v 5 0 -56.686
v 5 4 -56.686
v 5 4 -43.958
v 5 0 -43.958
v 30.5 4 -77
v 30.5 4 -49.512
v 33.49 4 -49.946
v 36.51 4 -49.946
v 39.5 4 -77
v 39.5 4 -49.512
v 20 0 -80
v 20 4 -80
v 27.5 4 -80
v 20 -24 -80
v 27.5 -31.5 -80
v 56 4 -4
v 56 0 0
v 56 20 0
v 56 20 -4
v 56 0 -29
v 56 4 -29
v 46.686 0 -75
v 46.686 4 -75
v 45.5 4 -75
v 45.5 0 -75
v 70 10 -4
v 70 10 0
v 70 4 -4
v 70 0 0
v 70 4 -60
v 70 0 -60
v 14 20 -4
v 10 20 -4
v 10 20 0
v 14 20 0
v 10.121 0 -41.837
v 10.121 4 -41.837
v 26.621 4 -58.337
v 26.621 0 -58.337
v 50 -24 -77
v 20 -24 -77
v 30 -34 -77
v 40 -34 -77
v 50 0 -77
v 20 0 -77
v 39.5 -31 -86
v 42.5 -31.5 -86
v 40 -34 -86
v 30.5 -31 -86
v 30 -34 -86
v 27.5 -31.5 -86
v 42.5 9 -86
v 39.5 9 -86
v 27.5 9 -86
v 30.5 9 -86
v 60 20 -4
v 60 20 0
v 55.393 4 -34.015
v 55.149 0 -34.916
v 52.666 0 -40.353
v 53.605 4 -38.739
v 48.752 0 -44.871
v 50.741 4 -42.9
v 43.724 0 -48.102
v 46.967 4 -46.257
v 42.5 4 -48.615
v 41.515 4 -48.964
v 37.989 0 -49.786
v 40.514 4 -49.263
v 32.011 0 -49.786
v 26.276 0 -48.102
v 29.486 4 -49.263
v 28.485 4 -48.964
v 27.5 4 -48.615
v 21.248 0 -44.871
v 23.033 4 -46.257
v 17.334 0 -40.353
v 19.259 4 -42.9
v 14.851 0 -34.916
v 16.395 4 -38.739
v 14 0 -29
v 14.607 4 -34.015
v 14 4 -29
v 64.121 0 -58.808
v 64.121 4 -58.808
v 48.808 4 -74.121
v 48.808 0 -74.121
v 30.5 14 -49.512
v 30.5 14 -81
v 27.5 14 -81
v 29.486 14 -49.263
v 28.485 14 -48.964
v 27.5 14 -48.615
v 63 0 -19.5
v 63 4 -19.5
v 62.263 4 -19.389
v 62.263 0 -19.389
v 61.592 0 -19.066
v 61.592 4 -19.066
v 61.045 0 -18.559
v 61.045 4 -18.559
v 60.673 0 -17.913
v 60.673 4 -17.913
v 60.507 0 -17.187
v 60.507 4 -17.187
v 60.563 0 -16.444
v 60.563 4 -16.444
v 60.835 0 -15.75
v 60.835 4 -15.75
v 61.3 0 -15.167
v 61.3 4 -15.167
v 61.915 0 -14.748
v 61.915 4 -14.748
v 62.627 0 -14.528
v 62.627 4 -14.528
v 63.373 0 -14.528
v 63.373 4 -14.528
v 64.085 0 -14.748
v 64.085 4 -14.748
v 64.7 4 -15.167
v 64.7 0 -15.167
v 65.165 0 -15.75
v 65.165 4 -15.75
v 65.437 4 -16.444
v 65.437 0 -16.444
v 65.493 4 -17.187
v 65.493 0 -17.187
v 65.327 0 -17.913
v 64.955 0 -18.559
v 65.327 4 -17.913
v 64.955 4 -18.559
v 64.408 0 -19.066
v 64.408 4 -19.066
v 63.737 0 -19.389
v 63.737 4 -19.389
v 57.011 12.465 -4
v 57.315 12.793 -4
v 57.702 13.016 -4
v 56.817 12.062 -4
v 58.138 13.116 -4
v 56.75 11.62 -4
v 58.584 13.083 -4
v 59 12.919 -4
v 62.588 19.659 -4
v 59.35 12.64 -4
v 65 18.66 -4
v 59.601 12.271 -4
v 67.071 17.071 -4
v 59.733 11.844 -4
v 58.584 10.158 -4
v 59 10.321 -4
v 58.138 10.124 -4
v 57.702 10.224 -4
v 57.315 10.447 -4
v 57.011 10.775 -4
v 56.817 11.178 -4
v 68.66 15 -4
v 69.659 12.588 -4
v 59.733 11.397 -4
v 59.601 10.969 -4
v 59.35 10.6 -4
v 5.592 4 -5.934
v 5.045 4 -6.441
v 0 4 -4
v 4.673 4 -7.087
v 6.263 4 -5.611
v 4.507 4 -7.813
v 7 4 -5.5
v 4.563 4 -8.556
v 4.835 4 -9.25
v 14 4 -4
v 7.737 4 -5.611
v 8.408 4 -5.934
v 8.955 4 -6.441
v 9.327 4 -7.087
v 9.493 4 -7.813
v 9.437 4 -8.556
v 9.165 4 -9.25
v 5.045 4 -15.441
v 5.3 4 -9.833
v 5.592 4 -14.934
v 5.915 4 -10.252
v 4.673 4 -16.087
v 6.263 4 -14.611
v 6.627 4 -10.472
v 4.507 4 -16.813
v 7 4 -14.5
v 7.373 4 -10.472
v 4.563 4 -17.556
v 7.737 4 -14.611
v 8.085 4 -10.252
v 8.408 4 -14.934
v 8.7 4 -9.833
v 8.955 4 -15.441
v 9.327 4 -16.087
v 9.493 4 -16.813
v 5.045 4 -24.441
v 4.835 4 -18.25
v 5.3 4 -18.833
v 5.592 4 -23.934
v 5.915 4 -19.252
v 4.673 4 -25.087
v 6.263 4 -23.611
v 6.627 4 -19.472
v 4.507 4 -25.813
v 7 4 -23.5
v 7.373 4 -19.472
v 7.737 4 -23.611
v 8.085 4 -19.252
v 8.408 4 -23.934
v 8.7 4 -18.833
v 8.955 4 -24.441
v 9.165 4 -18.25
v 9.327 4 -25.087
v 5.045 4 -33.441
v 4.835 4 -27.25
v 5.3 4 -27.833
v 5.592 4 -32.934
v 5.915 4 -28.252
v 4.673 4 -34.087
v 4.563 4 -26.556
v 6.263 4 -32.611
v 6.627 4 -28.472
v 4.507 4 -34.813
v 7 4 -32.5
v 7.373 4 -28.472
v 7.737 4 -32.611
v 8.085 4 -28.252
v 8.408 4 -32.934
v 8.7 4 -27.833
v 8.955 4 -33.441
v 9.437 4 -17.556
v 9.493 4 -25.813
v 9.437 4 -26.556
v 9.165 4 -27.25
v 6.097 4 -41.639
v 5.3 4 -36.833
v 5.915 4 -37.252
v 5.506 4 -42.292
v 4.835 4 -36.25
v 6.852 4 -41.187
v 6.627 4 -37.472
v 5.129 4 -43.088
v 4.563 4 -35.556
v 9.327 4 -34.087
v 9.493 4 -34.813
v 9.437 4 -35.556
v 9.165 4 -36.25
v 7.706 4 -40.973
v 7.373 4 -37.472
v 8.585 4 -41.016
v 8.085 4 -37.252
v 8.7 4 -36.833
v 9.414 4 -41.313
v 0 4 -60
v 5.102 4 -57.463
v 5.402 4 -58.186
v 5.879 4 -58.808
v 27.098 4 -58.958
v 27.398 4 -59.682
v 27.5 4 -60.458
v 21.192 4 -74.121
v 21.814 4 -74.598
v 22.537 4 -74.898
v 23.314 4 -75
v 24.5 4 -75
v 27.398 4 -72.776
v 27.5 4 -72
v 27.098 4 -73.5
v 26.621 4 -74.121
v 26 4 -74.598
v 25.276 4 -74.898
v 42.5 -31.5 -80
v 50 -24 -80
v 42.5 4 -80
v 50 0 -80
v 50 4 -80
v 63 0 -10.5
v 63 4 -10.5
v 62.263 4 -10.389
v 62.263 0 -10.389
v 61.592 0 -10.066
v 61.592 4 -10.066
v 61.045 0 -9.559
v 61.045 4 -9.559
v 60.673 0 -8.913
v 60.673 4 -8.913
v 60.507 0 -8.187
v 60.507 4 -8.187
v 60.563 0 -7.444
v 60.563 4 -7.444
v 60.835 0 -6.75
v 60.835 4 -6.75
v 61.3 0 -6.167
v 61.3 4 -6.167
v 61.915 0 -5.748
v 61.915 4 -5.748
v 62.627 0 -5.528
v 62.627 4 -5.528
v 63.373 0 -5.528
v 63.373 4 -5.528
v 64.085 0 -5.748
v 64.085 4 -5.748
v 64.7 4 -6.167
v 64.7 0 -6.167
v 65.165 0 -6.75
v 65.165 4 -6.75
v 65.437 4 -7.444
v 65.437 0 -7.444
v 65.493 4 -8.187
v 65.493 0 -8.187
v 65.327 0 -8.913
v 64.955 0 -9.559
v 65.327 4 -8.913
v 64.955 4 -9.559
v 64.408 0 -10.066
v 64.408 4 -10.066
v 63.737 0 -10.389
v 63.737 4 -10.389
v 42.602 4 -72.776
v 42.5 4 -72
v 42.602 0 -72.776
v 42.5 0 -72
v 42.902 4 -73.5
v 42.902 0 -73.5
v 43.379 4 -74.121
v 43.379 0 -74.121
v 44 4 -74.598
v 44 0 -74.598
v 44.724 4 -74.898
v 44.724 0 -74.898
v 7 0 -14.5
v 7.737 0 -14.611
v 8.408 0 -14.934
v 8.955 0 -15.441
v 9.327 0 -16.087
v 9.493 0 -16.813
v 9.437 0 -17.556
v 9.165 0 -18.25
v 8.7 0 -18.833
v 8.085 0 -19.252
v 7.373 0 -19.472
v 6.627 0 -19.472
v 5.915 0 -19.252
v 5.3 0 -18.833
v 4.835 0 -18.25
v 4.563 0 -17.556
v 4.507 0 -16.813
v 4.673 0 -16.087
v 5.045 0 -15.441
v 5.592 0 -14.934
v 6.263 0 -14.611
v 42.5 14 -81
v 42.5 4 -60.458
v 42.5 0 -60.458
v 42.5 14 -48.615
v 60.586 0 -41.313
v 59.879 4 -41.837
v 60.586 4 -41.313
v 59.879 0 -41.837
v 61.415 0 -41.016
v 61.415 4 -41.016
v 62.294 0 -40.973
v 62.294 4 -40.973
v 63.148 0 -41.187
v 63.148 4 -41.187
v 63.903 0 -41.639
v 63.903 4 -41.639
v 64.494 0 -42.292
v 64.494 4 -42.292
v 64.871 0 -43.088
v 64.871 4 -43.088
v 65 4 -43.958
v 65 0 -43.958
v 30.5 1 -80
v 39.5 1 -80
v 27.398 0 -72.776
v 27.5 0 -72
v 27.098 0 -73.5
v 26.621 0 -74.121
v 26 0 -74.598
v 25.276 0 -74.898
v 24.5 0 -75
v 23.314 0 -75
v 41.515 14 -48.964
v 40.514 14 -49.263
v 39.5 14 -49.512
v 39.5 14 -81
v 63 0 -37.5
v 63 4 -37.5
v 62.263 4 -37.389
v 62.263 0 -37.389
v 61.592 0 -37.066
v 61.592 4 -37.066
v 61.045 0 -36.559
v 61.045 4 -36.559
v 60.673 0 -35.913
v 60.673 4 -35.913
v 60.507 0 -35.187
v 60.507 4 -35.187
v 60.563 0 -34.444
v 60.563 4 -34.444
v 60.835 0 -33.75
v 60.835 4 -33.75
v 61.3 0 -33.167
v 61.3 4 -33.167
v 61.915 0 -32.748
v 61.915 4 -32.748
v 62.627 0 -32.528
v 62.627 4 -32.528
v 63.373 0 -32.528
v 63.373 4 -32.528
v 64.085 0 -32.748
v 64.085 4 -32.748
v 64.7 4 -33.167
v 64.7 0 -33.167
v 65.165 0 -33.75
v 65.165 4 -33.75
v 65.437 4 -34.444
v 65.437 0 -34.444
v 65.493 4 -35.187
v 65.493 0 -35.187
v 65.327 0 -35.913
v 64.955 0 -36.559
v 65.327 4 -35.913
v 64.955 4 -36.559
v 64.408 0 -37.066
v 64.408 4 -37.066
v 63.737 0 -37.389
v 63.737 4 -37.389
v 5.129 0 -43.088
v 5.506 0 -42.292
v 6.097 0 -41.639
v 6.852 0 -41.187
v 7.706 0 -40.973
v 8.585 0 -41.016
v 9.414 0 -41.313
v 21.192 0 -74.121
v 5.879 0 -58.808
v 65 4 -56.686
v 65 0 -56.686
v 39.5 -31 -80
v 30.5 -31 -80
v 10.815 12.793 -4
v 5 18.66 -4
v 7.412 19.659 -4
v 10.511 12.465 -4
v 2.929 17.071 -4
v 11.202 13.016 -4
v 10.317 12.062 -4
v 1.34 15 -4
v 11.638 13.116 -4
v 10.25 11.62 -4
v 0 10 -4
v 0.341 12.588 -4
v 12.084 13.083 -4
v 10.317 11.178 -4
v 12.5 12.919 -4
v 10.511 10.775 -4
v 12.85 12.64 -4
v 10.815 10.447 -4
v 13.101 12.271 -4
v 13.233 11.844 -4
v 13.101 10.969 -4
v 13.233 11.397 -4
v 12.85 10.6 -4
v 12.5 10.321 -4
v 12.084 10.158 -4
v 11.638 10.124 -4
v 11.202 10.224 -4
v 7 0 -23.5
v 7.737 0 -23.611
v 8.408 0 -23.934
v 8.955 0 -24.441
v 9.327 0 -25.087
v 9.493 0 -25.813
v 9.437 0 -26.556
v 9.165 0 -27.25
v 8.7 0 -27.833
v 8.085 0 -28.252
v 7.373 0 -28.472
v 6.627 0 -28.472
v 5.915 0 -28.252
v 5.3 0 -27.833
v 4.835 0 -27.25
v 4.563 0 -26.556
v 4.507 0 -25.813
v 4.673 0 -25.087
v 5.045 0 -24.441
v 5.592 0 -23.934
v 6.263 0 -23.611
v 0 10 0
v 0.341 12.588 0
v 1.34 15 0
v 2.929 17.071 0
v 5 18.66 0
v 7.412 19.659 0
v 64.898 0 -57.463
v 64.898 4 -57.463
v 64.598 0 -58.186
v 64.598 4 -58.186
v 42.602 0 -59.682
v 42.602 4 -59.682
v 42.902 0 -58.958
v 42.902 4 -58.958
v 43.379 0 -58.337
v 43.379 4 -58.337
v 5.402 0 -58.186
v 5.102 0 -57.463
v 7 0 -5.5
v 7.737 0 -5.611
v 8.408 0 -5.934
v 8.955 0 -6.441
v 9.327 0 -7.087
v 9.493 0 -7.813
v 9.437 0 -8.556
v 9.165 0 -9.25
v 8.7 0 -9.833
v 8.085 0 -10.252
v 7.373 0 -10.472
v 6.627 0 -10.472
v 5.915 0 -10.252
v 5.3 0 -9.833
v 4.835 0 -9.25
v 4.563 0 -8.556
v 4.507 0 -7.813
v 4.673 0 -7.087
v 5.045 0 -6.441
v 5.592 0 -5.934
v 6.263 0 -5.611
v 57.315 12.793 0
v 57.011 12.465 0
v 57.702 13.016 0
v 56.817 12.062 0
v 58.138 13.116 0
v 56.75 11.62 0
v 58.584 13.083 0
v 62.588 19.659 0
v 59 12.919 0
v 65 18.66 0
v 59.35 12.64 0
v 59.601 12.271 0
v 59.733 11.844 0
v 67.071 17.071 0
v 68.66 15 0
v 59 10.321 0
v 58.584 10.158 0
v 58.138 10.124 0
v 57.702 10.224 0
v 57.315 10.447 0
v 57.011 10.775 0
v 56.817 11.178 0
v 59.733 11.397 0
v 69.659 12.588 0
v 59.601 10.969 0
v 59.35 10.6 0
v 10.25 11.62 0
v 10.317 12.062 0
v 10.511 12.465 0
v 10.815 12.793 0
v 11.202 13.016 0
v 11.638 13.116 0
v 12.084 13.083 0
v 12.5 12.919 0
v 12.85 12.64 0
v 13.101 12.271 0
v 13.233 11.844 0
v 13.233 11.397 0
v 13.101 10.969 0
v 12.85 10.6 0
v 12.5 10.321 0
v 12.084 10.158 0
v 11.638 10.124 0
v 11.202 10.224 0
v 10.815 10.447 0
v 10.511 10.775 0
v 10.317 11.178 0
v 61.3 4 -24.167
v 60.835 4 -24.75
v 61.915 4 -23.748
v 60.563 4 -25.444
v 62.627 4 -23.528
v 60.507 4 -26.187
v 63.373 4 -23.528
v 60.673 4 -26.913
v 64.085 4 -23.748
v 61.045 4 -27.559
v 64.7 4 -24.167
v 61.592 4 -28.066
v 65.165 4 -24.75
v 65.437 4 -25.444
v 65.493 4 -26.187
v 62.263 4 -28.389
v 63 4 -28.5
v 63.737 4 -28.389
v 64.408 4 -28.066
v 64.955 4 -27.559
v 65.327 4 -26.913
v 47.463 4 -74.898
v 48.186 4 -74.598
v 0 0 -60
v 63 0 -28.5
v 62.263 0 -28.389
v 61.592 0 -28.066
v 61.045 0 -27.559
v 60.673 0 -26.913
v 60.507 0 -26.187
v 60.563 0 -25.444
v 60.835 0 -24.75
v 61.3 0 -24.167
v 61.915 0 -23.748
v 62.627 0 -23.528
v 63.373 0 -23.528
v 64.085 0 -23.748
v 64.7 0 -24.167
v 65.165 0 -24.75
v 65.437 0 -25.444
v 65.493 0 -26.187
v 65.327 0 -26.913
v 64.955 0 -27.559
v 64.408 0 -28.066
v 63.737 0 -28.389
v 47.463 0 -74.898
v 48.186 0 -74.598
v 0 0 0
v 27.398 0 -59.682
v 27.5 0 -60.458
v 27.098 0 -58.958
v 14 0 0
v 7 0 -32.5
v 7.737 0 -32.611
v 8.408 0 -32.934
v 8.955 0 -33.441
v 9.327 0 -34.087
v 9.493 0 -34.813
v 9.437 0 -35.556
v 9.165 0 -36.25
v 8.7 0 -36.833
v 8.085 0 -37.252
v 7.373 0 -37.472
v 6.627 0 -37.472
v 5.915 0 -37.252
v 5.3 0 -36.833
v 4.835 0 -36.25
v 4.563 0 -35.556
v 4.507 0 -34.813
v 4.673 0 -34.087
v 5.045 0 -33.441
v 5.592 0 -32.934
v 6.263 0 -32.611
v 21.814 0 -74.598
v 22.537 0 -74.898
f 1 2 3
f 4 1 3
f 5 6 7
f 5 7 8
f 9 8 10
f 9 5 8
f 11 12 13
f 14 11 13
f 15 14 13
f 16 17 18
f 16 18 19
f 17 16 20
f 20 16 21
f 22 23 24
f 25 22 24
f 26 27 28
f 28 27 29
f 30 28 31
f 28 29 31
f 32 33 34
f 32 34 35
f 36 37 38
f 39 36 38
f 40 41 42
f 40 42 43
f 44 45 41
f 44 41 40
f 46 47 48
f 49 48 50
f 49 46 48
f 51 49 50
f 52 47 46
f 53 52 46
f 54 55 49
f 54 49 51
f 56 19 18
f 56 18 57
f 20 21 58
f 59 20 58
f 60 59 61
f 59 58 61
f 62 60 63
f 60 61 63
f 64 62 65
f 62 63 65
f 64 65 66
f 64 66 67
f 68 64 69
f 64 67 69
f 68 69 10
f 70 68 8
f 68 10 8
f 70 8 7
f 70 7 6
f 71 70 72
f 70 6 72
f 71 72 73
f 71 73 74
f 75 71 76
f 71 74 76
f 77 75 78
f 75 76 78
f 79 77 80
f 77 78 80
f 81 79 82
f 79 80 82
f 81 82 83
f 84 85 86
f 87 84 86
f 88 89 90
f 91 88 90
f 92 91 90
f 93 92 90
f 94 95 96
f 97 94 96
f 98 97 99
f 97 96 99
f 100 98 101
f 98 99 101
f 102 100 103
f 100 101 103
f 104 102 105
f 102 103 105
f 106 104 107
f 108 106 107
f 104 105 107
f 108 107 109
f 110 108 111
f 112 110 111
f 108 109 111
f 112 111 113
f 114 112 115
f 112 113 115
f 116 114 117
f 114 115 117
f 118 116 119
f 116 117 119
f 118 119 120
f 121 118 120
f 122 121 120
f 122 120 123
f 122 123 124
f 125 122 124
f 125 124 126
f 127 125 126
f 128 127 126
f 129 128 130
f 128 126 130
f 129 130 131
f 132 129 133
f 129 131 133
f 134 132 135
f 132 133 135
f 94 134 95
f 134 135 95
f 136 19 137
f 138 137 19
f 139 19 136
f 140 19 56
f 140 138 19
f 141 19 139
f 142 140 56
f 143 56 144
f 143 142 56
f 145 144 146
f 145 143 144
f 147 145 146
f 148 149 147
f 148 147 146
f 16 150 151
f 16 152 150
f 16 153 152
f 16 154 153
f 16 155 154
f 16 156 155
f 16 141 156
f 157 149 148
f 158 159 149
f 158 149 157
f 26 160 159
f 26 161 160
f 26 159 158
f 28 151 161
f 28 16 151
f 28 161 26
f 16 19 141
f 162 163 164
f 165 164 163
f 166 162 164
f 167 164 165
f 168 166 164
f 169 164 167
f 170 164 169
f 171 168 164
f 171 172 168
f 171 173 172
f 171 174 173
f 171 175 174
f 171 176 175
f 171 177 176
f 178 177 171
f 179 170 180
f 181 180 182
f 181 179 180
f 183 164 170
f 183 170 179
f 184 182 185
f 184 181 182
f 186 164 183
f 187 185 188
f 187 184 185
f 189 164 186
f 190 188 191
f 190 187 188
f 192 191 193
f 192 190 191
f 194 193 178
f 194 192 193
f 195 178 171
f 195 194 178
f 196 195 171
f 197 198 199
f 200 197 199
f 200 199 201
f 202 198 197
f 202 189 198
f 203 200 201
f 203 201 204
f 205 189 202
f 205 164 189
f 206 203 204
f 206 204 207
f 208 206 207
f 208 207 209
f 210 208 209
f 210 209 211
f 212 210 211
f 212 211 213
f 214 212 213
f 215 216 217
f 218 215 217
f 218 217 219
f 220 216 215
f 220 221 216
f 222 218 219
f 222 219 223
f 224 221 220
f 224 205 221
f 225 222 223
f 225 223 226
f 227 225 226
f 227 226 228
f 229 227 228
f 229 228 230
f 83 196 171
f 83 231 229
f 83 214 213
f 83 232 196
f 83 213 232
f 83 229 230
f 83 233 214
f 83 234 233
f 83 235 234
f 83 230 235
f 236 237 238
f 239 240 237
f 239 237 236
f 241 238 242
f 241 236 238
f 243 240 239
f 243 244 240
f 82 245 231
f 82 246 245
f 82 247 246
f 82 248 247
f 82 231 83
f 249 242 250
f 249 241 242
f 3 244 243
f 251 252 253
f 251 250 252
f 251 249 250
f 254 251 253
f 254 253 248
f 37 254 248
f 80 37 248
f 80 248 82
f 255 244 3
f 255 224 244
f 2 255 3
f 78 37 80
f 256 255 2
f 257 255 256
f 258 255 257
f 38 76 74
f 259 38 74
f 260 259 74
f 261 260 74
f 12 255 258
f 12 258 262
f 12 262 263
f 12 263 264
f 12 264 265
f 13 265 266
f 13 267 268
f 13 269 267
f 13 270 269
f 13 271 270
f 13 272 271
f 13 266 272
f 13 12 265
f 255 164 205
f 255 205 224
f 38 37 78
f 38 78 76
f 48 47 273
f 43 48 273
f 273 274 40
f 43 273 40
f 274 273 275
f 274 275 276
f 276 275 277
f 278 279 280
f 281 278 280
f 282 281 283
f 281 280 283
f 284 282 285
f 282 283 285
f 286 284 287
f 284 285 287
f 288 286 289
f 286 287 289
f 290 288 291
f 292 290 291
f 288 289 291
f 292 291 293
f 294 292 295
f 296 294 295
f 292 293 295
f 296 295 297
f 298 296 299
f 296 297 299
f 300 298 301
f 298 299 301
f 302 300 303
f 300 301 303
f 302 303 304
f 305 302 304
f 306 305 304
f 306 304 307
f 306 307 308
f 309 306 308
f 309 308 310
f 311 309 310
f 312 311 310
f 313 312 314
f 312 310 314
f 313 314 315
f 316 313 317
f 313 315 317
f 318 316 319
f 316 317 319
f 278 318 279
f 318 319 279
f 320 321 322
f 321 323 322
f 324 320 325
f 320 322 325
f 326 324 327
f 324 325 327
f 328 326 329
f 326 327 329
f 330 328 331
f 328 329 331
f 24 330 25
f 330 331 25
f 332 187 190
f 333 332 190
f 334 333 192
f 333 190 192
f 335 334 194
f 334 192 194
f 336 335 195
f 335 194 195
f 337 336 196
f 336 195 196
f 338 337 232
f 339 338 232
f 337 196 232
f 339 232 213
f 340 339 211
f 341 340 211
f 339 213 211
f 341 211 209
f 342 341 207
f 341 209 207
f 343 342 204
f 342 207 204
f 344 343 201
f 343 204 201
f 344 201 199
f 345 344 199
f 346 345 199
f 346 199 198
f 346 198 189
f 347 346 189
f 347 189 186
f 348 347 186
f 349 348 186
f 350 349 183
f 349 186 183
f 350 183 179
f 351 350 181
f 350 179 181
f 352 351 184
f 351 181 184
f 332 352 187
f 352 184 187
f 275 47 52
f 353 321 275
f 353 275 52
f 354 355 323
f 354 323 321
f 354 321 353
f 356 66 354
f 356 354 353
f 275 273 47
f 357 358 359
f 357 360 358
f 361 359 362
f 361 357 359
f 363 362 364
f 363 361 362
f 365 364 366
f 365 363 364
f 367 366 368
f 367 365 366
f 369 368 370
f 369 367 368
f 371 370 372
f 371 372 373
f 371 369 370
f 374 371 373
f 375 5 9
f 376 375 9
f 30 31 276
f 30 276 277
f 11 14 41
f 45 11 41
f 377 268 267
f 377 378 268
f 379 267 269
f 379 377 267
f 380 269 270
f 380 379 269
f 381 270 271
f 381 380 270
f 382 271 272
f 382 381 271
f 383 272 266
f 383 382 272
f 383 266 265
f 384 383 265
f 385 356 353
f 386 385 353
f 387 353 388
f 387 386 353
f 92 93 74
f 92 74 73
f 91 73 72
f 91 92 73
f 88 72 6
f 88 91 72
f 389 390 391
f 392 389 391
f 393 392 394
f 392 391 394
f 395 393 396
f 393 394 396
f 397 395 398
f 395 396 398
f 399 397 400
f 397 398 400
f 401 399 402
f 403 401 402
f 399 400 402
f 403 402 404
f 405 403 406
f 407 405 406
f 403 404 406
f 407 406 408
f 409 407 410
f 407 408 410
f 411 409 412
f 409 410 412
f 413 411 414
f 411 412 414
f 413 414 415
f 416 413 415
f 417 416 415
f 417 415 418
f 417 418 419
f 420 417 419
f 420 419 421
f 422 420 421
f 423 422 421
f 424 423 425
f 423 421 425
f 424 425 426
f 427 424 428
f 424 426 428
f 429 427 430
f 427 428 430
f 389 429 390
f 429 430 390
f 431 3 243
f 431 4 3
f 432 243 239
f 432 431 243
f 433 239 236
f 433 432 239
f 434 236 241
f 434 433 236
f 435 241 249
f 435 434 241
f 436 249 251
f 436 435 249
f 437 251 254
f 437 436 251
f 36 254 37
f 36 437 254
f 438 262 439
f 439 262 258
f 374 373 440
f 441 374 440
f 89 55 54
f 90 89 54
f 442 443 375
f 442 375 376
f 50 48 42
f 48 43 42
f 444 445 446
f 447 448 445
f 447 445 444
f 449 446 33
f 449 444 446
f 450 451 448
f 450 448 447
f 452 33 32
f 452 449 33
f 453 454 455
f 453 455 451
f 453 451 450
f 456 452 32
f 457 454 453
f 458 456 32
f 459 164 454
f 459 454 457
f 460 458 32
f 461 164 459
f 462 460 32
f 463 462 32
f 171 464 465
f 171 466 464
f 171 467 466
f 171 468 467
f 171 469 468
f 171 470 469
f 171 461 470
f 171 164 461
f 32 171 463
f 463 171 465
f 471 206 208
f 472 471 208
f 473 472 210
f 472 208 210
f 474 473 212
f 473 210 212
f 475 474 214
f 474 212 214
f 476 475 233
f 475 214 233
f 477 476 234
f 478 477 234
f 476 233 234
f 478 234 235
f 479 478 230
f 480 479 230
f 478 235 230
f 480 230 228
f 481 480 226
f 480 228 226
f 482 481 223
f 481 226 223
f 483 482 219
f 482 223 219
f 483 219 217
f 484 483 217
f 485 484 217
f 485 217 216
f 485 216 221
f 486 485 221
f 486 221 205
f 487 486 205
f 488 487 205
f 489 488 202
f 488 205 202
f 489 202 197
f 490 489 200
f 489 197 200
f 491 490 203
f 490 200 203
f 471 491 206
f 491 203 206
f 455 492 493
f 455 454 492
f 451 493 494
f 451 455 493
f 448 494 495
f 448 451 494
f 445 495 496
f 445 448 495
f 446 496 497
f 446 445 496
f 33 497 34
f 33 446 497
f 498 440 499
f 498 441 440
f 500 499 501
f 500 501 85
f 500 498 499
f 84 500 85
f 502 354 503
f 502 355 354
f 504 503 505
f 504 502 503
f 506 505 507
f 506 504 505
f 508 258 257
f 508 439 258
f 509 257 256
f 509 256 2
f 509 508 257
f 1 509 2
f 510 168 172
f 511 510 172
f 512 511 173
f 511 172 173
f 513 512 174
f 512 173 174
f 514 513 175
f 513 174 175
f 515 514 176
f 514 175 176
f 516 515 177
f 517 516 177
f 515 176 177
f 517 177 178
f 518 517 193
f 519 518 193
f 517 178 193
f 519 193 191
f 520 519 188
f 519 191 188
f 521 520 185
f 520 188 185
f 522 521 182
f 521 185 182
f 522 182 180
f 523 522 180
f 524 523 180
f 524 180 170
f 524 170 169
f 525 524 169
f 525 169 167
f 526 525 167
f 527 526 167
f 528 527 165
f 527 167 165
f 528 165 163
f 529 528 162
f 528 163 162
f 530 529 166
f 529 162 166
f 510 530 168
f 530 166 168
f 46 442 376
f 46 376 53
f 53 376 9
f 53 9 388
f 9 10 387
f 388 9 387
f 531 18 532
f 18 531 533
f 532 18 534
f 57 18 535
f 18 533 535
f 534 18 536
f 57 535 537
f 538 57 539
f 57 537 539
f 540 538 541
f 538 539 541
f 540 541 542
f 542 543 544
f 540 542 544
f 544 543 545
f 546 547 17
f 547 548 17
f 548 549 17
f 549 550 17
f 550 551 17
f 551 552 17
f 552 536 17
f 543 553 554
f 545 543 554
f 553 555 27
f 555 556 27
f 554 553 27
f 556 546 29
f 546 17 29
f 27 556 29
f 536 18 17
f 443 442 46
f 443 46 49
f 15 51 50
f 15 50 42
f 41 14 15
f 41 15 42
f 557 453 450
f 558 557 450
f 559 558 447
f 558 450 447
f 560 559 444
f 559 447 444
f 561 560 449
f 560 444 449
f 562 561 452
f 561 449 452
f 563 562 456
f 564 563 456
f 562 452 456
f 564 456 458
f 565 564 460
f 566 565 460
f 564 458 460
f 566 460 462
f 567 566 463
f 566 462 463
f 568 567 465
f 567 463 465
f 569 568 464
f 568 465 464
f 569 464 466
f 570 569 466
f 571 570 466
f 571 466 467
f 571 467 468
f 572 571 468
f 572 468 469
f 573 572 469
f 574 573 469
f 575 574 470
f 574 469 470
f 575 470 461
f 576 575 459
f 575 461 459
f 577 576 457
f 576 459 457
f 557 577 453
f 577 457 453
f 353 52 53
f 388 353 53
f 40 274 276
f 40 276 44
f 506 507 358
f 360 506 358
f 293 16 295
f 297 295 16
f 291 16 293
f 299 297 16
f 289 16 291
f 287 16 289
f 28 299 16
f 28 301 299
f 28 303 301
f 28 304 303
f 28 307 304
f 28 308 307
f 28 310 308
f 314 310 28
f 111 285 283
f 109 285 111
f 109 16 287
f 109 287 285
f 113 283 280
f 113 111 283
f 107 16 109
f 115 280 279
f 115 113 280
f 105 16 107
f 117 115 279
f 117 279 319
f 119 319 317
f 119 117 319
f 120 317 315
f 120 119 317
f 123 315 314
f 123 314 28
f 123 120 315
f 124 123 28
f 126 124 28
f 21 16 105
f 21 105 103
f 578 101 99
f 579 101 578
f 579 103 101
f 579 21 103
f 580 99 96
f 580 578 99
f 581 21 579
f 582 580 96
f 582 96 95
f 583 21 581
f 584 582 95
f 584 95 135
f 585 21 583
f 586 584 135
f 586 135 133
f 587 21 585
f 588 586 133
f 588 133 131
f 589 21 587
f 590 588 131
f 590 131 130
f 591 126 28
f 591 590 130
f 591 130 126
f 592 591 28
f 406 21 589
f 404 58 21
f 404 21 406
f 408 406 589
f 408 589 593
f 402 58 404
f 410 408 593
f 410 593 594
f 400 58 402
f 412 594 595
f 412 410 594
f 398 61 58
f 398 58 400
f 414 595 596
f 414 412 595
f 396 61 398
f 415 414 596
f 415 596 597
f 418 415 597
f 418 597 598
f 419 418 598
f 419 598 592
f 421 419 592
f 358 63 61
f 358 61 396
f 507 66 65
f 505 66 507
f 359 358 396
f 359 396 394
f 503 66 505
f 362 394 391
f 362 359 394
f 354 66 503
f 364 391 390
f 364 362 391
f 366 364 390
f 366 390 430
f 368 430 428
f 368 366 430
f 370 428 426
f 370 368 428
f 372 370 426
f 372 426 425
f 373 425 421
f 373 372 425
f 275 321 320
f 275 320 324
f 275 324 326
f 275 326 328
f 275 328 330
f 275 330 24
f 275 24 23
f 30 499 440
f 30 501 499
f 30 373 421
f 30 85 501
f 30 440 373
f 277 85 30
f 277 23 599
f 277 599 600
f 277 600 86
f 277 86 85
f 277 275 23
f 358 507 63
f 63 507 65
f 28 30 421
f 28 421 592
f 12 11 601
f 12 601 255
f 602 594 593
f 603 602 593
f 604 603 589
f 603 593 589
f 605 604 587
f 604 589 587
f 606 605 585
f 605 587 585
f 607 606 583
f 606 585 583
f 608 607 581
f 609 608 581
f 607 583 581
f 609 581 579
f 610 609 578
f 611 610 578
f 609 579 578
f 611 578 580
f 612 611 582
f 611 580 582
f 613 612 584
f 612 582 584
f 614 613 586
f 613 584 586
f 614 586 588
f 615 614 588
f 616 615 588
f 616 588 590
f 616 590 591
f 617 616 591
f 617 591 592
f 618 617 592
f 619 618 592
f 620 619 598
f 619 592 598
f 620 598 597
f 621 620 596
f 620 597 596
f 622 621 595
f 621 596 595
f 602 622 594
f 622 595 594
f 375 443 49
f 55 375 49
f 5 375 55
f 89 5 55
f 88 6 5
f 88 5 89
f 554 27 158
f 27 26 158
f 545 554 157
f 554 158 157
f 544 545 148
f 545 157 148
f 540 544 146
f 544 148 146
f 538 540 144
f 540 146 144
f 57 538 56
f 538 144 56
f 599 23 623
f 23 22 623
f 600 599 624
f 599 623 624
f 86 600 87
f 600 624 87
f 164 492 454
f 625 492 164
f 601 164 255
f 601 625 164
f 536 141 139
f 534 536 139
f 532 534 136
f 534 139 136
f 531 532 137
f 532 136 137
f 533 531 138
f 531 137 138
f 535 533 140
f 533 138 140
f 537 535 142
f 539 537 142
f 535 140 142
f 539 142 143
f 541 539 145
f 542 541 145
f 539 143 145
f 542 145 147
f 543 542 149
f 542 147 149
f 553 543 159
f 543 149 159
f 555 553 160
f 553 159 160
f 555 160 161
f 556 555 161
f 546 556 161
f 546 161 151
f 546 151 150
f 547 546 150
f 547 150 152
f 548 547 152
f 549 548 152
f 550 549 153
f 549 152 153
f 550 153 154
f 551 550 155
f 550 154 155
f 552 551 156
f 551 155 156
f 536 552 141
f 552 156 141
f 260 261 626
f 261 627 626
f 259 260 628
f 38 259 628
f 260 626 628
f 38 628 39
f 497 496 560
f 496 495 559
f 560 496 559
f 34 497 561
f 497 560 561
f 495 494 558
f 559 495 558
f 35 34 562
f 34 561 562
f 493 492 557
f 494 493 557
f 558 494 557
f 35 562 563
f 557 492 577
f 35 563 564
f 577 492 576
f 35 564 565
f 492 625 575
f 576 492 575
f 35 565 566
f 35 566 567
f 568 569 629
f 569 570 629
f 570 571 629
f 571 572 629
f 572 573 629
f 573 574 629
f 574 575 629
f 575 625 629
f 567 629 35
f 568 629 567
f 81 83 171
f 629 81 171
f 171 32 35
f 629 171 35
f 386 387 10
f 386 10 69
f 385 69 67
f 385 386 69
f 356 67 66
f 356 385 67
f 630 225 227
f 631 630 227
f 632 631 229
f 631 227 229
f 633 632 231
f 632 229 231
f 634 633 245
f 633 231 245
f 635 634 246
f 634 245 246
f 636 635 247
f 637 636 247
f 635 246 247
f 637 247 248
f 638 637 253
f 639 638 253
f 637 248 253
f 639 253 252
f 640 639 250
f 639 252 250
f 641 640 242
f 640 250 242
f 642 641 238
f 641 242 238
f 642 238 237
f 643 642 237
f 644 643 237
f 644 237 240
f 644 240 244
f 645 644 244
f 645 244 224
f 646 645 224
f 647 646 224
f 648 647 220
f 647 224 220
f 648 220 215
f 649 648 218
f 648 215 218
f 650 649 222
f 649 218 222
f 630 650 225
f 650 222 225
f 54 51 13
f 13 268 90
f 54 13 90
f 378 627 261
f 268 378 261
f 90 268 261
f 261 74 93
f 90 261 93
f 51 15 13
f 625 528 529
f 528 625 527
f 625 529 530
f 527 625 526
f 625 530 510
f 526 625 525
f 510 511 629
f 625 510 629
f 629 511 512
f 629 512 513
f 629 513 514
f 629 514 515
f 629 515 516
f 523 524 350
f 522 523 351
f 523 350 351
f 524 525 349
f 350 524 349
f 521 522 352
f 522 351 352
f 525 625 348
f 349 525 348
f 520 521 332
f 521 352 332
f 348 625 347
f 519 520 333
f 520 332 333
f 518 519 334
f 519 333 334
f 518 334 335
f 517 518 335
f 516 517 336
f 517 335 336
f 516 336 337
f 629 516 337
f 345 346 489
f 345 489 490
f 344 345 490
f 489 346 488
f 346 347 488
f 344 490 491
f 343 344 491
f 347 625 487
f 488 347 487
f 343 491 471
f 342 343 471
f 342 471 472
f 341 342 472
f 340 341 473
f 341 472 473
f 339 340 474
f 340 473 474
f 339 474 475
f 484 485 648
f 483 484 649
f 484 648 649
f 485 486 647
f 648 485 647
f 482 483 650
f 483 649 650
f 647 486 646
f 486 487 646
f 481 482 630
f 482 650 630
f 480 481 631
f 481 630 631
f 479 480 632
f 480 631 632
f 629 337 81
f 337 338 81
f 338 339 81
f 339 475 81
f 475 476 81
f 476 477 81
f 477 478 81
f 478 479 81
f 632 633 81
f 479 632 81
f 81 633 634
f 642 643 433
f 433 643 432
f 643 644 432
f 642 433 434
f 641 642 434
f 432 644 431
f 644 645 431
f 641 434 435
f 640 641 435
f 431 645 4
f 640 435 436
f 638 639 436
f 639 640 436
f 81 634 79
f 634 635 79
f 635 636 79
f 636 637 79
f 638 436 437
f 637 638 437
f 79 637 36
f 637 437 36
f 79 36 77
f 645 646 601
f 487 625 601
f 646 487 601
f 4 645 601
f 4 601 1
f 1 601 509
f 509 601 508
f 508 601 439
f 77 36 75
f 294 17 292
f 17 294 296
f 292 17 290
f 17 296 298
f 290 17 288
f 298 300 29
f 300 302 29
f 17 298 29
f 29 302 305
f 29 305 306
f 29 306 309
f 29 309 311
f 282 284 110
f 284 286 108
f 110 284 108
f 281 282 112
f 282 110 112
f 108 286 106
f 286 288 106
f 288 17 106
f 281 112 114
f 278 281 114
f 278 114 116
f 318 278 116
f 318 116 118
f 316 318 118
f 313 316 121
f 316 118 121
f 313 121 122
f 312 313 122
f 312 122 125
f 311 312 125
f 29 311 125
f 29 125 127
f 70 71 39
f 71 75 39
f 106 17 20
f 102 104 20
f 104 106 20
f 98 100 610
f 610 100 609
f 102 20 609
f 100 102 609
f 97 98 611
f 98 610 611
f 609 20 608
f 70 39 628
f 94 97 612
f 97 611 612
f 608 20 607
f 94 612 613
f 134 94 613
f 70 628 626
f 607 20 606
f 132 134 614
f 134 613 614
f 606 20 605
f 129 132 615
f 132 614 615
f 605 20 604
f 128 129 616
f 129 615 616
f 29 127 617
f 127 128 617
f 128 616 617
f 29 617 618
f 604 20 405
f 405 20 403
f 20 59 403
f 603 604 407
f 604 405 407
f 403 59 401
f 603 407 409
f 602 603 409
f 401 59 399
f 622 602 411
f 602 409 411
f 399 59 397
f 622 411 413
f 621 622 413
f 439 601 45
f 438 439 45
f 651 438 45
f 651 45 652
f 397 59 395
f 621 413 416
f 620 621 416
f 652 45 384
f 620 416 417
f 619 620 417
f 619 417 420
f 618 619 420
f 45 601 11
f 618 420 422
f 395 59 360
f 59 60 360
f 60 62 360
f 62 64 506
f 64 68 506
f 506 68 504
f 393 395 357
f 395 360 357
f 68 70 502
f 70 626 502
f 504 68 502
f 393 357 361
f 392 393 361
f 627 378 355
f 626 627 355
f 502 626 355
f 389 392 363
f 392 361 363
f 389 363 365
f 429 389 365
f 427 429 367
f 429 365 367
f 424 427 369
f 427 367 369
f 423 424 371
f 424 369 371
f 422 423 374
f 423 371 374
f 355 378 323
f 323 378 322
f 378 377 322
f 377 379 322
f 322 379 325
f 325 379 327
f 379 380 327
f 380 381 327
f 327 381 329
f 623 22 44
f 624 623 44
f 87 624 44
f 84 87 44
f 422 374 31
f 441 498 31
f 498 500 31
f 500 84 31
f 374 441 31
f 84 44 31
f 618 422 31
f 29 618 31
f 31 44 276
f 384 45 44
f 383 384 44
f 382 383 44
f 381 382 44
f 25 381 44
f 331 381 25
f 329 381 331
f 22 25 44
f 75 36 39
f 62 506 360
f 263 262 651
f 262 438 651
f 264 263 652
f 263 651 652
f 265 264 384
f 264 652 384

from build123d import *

# Parameters (mm, degrees)
SKETCH_1_W          = 70
SKETCH_1_H          = 80
EXTRUDE_1_DEPTH     = 4
SKETCH_2_W          = 70
SKETCH_2_H          = 4
EXTRUDE_2_DEPTH     = 16
CUT_EXTRUDE_1_DEPTH = 109.166538264
CHAMFER_1_SIZE      = 20
SKETCH_8_W          = 30
SKETCH_8_H          = 3
EXTRUDE_4_DEPTH     = 34
EXTRUDE_START       = 10
EXTRUDE_6_DEPTH     = 10
SKETCH_11_W         = 9
SKETCH_11_H         = 37.243398564
CUT_EXTRUDE_2_DEPTH = 10
CHAMFER_2_SIZE      = 3
SKETCH_12_W         = 3
SKETCH_12_H         = 48
EXTRUDE_7_DEPTH     = 6
CHAMFER_3_SIZE      = 5
SKETCH_13_W         = 9
SKETCH_13_H         = 3
EXTRUDE_8_DEPTH     = 6
CHAMFER_4_SIZE      = 10
CUT_EXTRUDE_3_DEPTH = 4
FILLET_3_R          = 3
SKETCH_15_R         = 2.5
CUT_EXTRUDE_4_DEPTH = 4
FILLET_4_R          = 10
SKETCH_16_R         = 1.5
CUT_EXTRUDE_5_DEPTH = 4


with BuildPart() as part:
    # 草图1 → 凸台-拉伸1 (new body)
    with BuildSketch(Plane(origin=(0, 0, 0), x_dir=(1, 0, 0), z_dir=(0, 1, 0))):
        with Locations((35, 40)):
            Rectangle(SKETCH_1_W, SKETCH_1_H)
    extrude(amount=EXTRUDE_1_DEPTH)

    # 草图2 → 凸台-拉伸2 (add)
    with BuildSketch(Plane(origin=(0, 4, 0), x_dir=(1, 0, 0), z_dir=(0, 1, 0))):
        with Locations((35, 2)):
            Rectangle(SKETCH_2_W, SKETCH_2_H)
    extrude(amount=EXTRUDE_2_DEPTH)

    # 草图4 → 切除-拉伸1 (cut, through all)
    with BuildSketch(Plane(origin=(0, 20, 0), x_dir=(1, 0, 0), z_dir=(0, 1, 0))):
        with BuildLine():
            Line((14, 29), (14, 0))
            Line((14, 0), (56, 0))
            Line((56, 0), (56, 29))
            ThreePointArc((56, 29), (35, 50), (14, 29))
        make_face()
    extrude(amount=-CUT_EXTRUDE_1_DEPTH, mode=Mode.SUBTRACT)

    # 倒角1
    chamfer_1_edges = [part.edges().sort_by_distance(p)[0] for p in [
        (0, 2, -80),
        (70, 2, -80),
    ]]
    chamfer(chamfer_1_edges, length=CHAMFER_1_SIZE)

    # 草图8 → 凸台-拉伸4 (add)
    with BuildSketch(Plane.XZ):
        with Locations((35, -78.5)):
            Rectangle(SKETCH_8_W, SKETCH_8_H)
    extrude(amount=EXTRUDE_4_DEPTH)

    # 草图10 → 凸台-拉伸6 (add)
    with BuildSketch(Plane(origin=(0, 4, 0), x_dir=(1, 0, 0), z_dir=(0, 1, 0)).offset(EXTRUDE_START)):
        with BuildLine():
            Line((42.5, 48.615045246), (42.5, 80))
            Line((42.5, 80), (27.5, 80))
            Line((27.5, 80), (27.5, 48.615045246))
            ThreePointArc((27.5, 48.615045246), (35, 50), (42.5, 48.615045246))
        make_face()
    extrude(amount=-EXTRUDE_6_DEPTH)

    # 草图11 → 切除-拉伸2 (cut)
    with BuildSketch(Plane(origin=(0, 14, 0), x_dir=(1, 0, 0), z_dir=(0, 1, 0))):
        with Locations((35, 61.378300718)):
            Rectangle(SKETCH_11_W, SKETCH_11_H)
    extrude(amount=-CUT_EXTRUDE_2_DEPTH, mode=Mode.SUBTRACT)

    # 倒角2
    chamfer_2_edges = [part.edges().sort_by_distance(p)[0] for p in [
        (35, 4, -80),
    ]]
    chamfer(chamfer_2_edges, length=CHAMFER_2_SIZE)

    # 草图12 → 凸台-拉伸7 (add)
    with BuildSketch(Plane(origin=(0, 0, -80), x_dir=(-1, 0, 0), z_dir=(0, 0, -1))):
        with Locations((-41, -10)):
            Rectangle(SKETCH_12_W, SKETCH_12_H)
        with Locations((-29, -10)):
            Rectangle(SKETCH_12_W, SKETCH_12_H)
    extrude(amount=EXTRUDE_7_DEPTH)

    # 倒角3
    chamfer_3_edges = [part.edges().sort_by_distance(p)[0] for p in [
        (41, 14, -86),
        (29, 14, -86),
    ]]
    chamfer(chamfer_3_edges, length=CHAMFER_3_SIZE)

    # 草图13 → 凸台-拉伸8 (add)
    with BuildSketch(Plane(origin=(0, 0, -80), x_dir=(-1, 0, 0), z_dir=(0, 0, -1))):
        with Locations((-35, -32.5)):
            Rectangle(SKETCH_13_W, SKETCH_13_H)
    extrude(amount=EXTRUDE_8_DEPTH)

    # 倒角4
    chamfer_4_edges = [part.edges().sort_by_distance(p)[0] for p in [
        (50, -34, -78.5),
        (20, -34, -78.5),
    ]]
    chamfer(chamfer_4_edges, length=CHAMFER_4_SIZE)

    # 草图14 → 切除-拉伸3 (cut)
    with BuildSketch(Plane(origin=(0, 4, 0), x_dir=(1, 0, 0), z_dir=(0, 1, 0))):
        Polygon((22.071067812, 75), (5, 57.928932188), (5, 36.715728753), (27.5, 59.215728753), (27.5, 75), align=None)
        Polygon((47.928932188, 75), (42.5, 75), (42.5, 59.215728753), (65, 36.715728753), (65, 57.928932188), align=None)
    extrude(amount=-CUT_EXTRUDE_3_DEPTH, mode=Mode.SUBTRACT)

    # 圆角3
    fillet_3_edges = [part.edges().sort_by_distance(p)[0] for p in [
        (47.928932188, 2, -75),
        (65, 2, -57.928932188),
        (65, 2, -36.715728753),
        (42.5, 2, -59.215728753),
        (42.5, 2, -75),
        (5, 2, -36.715728753),
        (5, 2, -57.928932188),
        (22.071067812, 2, -75),
        (27.5, 2, -75),
        (27.5, 2, -59.215728753),
    ]]
    fillet(fillet_3_edges, radius=FILLET_3_R)

    # 草图15 → 切除-拉伸4 (cut)
    with BuildSketch(Plane(origin=(0, 4, 0), x_dir=(1, 0, 0), z_dir=(0, 1, 0))):
        with Locations(Location((7, 8, 0), (0, 0, 270))):
            Circle(SKETCH_15_R)
        with Locations(Location((7, 17, 0), (0, 0, 270))):
            Circle(SKETCH_15_R)
        with Locations(Location((7, 26, 0), (0, 0, 270))):
            Circle(SKETCH_15_R)
        with Locations(Location((7, 35, 0), (0, 0, 270))):
            Circle(SKETCH_15_R)
        with Locations(Location((63, 35, 0), (0, 0, 90))):
            Circle(SKETCH_15_R)
        with Locations(Location((63, 26, 0), (0, 0, 90))):
            Circle(SKETCH_15_R)
        with Locations(Location((63, 17, 0), (0, 0, 90))):
            Circle(SKETCH_15_R)
        with Locations(Location((63, 8, 0), (0, 0, 90))):
            Circle(SKETCH_15_R)
    extrude(amount=-CUT_EXTRUDE_4_DEPTH, mode=Mode.SUBTRACT)

    # 圆角4
    fillet_4_edges = [part.edges().sort_by_distance(p)[0] for p in [
        (0, 20, -2),
        (70, 20, -2),
    ]]
    fillet(fillet_4_edges, radius=FILLET_4_R)

    # 草图16 → 切除-拉伸5 (cut)
    with BuildSketch(Plane(origin=(-162.95666402, 61.923916545, -4), x_dir=(-0.1273989198368121, 0.9918515590673908, 0), z_dir=(0, 0, -1))):
        with Locations(Location((-72.151278538, 166.87443555, 0), (0, 0, 277.319311568))):
            Circle(SKETCH_16_R)
        with Locations(Location((-78.075328311, 212.995533047, 0), (0, 0, 277.319311568))):
            Circle(SKETCH_16_R)
    extrude(amount=-CUT_EXTRUDE_5_DEPTH, mode=Mode.SUBTRACT)


solid = part.part
